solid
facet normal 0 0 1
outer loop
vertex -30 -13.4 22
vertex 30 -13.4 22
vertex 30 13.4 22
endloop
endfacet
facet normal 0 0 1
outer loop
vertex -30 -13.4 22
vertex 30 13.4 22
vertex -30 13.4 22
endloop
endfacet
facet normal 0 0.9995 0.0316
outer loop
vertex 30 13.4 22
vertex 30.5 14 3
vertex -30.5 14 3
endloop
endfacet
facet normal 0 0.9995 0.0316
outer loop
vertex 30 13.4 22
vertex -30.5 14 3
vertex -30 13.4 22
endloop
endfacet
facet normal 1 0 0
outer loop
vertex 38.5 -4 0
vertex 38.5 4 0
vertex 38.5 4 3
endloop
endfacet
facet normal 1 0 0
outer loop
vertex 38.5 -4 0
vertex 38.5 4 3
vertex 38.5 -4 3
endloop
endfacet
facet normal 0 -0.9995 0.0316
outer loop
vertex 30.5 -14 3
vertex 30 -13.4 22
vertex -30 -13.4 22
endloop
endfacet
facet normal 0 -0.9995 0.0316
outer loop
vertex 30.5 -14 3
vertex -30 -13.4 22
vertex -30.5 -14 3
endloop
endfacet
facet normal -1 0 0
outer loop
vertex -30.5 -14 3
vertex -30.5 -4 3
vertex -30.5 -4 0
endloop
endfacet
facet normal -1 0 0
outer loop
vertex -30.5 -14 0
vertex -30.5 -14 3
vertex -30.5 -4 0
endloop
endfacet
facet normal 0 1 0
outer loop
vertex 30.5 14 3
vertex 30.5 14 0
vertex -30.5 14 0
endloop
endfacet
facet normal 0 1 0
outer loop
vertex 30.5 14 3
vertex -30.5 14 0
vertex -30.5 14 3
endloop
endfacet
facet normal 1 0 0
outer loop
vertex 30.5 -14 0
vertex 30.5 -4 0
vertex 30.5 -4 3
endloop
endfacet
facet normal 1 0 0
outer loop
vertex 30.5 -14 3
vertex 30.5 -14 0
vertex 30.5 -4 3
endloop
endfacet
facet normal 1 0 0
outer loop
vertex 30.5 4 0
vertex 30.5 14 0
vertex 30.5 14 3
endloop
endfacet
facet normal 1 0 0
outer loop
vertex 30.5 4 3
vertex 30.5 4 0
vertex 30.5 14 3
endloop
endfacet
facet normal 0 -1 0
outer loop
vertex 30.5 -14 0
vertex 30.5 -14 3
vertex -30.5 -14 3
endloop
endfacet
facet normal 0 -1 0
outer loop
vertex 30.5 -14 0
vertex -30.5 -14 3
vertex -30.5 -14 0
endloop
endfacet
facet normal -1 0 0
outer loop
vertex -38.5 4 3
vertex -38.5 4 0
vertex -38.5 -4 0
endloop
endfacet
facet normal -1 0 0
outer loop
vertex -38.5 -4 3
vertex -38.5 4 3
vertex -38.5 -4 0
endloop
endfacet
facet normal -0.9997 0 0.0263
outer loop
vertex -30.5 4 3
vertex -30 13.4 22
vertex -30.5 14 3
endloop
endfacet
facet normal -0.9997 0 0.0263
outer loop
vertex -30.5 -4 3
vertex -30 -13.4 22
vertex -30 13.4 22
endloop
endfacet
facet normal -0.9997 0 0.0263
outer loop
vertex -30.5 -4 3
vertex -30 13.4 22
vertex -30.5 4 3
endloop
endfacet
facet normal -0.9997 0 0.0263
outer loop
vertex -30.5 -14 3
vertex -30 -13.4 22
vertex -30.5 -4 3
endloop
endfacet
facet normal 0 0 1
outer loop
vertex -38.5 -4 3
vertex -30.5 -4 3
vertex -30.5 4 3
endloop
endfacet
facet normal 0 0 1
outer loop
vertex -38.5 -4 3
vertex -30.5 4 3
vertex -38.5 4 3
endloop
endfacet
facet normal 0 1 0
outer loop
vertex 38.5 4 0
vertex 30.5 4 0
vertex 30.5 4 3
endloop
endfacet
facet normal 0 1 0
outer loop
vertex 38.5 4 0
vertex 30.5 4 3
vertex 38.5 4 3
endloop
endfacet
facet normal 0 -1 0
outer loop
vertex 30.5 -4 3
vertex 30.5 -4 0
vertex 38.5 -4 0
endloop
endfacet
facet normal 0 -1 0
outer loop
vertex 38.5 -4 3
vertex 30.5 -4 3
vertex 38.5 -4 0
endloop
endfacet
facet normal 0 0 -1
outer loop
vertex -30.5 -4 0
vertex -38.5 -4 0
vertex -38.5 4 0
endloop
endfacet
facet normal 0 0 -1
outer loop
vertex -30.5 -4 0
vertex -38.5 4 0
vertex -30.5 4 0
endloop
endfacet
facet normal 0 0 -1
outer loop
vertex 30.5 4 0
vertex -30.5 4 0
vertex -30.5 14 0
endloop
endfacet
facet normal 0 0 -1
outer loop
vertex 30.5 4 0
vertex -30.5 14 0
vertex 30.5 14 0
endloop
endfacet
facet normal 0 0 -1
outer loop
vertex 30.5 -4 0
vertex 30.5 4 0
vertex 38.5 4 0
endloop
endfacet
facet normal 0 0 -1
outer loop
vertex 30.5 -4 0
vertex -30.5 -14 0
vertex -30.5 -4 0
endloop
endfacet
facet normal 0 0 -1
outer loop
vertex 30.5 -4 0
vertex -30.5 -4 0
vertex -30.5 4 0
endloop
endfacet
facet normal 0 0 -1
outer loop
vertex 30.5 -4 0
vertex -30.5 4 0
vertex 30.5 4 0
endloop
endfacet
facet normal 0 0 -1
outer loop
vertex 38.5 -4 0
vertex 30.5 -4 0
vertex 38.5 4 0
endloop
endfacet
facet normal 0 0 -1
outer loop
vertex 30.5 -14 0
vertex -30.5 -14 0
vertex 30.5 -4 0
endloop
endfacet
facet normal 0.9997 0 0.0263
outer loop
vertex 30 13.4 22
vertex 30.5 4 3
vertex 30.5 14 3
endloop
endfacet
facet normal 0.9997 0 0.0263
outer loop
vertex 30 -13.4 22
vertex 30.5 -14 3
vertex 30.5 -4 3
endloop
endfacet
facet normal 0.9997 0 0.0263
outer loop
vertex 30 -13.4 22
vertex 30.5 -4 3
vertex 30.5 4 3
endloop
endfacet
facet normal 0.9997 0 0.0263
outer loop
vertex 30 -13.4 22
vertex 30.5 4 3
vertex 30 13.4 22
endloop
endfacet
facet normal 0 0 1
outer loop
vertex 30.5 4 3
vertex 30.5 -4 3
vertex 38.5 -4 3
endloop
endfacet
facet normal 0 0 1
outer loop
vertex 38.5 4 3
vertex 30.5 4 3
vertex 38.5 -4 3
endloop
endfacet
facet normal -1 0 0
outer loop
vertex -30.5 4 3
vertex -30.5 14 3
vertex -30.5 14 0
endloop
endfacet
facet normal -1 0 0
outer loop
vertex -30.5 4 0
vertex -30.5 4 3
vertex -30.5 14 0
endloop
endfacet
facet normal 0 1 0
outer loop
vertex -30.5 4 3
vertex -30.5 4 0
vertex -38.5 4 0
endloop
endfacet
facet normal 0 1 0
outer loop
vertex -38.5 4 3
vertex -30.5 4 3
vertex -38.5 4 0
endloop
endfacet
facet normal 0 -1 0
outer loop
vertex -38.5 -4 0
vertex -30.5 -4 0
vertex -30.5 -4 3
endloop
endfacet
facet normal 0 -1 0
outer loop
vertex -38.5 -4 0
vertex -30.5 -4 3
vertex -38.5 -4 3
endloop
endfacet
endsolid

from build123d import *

# Parameters (mm, degrees)
F1_DEPTH = 15
F3_DEPTH = 35
F4_W     = 8
F4_H     = 8
F5_DEPTH = 3


with BuildPart() as f1:
    # F0 (on Front) → F1 (new body, symmetric)
    with BuildSketch(Plane.XZ):
        Polygon((30, 22), (-30, 22), (-30.5, 3), (-30.5, 0), (30.5, 0), (30.5, 3), align=None)
    extrude(amount=F1_DEPTH, both=True)

    # F2 (on Right) → F3 (intersect, symmetric)
    with BuildSketch(Plane.YZ):
        Polygon((-14, 3), (-14, 0), (14, 0), (14, 3), (13.4, 22), (-13.4, 22), align=None)
    extrude(amount=F3_DEPTH, both=True, mode=Mode.INTERSECT)

    # F4 (on face) → F5 (join)
    with BuildSketch(Plane(origin=(0, 0, 0), x_dir=(1, 0, 0), z_dir=(0, 0, -1))):
        with Locations((34.5, 0)):
            Rectangle(F4_W, F4_H)
    extrude(amount=-F5_DEPTH)

    # F6: F1 across plane


with BuildPart() as f1_1:
    add(f1.part)
    add(f1.part.mirror(Plane.YZ))


solid = f1_1.part
